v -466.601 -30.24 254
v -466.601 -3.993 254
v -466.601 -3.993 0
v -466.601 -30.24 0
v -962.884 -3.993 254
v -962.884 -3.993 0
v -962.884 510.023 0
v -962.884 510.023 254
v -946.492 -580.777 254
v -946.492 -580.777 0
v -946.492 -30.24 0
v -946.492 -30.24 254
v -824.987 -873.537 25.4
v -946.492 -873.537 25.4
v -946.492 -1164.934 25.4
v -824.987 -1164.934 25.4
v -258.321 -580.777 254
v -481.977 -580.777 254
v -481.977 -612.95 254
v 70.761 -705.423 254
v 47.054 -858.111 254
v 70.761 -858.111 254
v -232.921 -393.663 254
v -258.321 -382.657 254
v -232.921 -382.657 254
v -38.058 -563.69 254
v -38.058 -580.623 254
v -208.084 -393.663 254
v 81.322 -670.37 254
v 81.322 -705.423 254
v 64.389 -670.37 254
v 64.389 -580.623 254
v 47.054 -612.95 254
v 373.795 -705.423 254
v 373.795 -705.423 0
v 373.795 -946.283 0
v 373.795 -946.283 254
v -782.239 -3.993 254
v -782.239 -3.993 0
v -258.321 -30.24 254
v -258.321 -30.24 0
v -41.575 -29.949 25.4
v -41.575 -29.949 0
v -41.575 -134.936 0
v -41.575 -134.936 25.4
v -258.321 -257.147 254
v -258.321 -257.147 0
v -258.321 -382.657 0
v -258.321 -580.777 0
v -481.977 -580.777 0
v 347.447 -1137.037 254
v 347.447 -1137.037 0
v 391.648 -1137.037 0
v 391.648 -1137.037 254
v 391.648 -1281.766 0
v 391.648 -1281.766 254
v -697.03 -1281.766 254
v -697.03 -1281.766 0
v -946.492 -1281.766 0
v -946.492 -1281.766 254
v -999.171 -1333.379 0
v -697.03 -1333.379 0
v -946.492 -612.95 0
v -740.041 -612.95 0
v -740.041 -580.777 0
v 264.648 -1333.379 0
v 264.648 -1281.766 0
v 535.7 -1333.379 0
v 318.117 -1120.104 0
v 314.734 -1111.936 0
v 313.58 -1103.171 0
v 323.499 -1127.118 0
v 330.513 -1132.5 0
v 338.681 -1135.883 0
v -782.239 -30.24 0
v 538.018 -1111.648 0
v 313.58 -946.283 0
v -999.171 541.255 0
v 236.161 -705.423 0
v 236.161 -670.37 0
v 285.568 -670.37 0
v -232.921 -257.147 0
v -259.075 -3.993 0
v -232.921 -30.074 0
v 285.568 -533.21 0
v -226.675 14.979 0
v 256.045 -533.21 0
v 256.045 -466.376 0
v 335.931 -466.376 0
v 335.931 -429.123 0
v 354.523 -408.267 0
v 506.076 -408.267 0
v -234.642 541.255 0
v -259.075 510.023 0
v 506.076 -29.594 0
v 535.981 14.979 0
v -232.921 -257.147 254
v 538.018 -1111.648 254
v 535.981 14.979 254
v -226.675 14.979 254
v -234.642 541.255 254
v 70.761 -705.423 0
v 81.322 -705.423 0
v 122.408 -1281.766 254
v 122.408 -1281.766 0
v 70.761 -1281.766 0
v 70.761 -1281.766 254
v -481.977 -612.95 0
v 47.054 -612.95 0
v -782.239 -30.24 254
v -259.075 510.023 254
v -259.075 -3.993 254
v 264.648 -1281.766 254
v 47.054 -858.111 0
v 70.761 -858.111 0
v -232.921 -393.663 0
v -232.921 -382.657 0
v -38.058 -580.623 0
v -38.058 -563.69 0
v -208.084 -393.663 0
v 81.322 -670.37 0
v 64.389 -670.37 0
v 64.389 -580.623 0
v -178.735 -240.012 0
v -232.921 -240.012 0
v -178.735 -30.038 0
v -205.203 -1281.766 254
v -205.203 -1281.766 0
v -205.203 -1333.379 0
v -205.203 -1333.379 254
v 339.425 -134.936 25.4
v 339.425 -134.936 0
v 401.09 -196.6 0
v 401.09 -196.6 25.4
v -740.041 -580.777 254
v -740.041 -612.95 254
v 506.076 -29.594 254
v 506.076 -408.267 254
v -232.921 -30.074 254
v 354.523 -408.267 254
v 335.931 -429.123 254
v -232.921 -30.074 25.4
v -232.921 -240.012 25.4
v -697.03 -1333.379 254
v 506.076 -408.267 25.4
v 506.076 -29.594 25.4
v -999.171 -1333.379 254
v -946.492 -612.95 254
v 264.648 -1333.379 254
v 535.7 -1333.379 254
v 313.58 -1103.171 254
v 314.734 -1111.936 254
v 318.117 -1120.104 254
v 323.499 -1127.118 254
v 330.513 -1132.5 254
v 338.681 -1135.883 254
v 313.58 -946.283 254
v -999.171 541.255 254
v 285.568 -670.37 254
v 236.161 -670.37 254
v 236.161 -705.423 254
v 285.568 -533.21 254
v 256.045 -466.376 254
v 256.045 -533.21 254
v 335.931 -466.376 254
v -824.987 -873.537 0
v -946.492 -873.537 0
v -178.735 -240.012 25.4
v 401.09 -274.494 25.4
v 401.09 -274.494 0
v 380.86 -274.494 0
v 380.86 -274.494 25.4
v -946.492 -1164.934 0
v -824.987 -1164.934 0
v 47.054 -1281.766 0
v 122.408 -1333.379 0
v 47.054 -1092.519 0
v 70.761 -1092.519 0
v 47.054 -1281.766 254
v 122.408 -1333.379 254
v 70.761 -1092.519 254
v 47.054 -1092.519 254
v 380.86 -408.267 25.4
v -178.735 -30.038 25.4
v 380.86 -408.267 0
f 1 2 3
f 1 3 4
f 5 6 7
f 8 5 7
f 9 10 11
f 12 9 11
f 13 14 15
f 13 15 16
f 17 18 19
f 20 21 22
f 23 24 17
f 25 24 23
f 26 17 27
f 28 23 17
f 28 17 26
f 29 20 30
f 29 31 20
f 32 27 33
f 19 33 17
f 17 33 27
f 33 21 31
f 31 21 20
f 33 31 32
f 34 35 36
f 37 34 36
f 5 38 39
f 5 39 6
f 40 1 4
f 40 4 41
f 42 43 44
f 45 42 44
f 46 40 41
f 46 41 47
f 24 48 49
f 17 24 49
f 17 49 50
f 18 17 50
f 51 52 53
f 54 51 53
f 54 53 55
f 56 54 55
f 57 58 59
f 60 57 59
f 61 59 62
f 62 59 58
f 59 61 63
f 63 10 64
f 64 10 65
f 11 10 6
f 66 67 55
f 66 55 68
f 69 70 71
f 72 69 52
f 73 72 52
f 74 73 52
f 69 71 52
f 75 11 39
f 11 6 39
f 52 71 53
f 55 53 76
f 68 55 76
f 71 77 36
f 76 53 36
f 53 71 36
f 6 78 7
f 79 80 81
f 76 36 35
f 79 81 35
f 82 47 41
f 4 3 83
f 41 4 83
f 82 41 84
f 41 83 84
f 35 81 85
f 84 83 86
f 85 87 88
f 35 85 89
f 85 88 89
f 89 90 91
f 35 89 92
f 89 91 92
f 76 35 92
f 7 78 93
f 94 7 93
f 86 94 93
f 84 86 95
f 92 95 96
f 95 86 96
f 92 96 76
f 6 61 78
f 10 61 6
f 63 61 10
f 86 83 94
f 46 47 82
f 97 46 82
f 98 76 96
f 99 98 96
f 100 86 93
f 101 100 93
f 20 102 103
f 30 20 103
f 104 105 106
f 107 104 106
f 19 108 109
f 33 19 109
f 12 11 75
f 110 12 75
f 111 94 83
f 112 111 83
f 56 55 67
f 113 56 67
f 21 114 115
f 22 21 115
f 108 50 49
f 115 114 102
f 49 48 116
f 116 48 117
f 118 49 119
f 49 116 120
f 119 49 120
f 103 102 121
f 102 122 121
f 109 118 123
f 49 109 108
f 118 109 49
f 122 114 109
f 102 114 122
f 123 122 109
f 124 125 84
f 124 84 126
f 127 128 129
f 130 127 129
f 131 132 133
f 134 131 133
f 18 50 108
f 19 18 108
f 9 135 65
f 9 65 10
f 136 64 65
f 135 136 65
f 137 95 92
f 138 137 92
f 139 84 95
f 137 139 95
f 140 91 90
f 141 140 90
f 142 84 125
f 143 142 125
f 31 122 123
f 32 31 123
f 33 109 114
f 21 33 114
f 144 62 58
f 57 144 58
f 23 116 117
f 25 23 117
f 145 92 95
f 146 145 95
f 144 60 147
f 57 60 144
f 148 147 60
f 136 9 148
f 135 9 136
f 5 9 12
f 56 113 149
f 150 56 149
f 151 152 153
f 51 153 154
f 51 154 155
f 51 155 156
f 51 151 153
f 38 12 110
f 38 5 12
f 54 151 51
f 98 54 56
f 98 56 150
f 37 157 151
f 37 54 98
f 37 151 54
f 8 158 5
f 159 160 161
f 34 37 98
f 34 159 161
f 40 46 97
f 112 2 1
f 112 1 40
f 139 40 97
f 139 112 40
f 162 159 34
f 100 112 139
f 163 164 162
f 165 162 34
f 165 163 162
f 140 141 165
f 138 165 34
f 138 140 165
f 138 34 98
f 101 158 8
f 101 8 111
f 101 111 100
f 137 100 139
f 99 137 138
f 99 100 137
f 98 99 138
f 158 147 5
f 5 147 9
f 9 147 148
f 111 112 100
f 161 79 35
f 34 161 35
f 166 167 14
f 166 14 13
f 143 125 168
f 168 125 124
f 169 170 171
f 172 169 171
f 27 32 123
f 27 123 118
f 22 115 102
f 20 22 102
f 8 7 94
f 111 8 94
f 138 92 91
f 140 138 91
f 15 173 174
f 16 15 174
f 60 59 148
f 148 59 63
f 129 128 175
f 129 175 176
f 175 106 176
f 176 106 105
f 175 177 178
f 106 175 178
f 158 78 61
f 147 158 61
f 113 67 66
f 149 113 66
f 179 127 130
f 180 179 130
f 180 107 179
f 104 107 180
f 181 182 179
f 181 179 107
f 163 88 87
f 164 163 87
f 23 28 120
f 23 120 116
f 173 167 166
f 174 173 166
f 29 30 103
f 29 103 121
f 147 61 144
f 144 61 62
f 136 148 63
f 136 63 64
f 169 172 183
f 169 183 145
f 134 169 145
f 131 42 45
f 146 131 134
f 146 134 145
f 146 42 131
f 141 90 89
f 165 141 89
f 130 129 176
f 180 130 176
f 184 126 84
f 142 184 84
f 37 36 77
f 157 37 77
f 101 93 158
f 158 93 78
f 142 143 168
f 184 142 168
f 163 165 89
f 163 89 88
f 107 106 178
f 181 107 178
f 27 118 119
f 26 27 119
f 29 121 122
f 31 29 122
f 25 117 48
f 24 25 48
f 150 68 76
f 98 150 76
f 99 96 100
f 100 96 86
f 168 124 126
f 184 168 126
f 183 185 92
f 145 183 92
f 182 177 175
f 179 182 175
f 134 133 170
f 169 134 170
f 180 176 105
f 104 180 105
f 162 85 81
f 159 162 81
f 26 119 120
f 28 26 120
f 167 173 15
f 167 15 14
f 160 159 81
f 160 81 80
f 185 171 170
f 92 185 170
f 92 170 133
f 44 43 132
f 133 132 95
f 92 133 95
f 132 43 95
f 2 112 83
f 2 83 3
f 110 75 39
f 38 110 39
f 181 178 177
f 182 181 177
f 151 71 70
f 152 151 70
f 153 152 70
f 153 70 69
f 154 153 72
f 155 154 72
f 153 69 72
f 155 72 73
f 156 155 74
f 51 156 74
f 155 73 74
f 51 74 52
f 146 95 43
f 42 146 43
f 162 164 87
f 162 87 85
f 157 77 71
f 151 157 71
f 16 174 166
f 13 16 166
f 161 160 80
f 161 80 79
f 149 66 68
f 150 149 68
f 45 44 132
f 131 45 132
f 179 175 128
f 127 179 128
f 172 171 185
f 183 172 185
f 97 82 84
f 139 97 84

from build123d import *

# Parameters (mm, degrees)
F2_DEPTH = 254
F3_DEPTH = 25.4
F1_W     = 121.5051418
F1_H     = 291.3972582
F4_DEPTH = 25.4


# Not quite as in the source:
# - ends of sketch curves that miss each other by under 0.0002 mm in the source are joined


with BuildPart() as f2:
    # F1 (on face) → F2 (new body)
    with BuildSketch(Plane.XY):
        with BuildLine():
            Line((313.5800008442, -946.2826725998), (313.5800008442, -1103.1705731998))
            ThreePointArc((313.5800008442, -1103.1705731998), (323.4993407748, -1127.1179168691), (347.4466844442, -1137.0372313998))
            Line((347.4466844442, -1137.0372313998), (391.6476882442, -1137.0372567998))
            Line((391.6476882442, -1137.0372567998), (391.6476882442, -1281.7658725998))
            Line((391.6476882442, -1281.7658725998), (264.6476882442, -1281.7658725998))
            Line((264.6476882442, -1281.7658725998), (264.6476882442, -1333.3786725998))
            Line((264.6476882442, -1333.3786725998), (535.6998512442, -1333.3786725998))
            Line((535.6998512442, -1333.3786725998), (538.0177605074, -1111.6484430823))
            Line((538.0177605074, -1111.6484430823), (535.9808760803, 14.9786700639))
            Line((535.9808760803, 14.9786700639), (-226.6753639778, 14.9786700639))
            Line((-226.6753639778, 14.9786700639), (-234.6419504656, 541.2551566362))
            Line((-234.6419504656, 541.2551566362), (-999.1706609726, 541.2551566362))
            Line((-999.1706609726, 541.2551566362), (-999.1706609726, -1333.3786725998))
            Line((-999.1706609726, -1333.3786725998), (-697.0301953558, -1333.3786725998))
            Line((-697.0301953558, -1333.3786725998), (-697.0301953558, -1281.7658725998))
            Line((-697.0301953558, -1281.7658725998), (-946.4920535558, -1281.7658725998))
            Line((-946.4920535558, -1281.7658725998), (-946.4920535558, -1164.9343561998))
            Line((-946.4920535558, -1164.9343561998), (-946.4920535558, -873.5370979998))
            Line((-946.4920535558, -873.5370979998), (-946.4920535558, -612.9500143998))
            Line((-946.4920535558, -612.9500143998), (-740.0408535558, -612.9500143998))
            Line((-740.0408535558, -612.9500143998), (-740.0408535558, -587.1436143998))
            Line((-740.0408535558, -587.1436143998), (-740.0408535558, -580.7766725998))
            Line((-740.0408535558, -580.7766725998), (-946.4920535558, -580.7766725998))
            Line((-946.4920535558, -580.7766725998), (-946.4920535558, -30.2401307998))
            Line((-946.4920535558, -30.2401307998), (-782.2387117558, -30.2401307998))
            Line((-782.2387117558, -30.2401307998), (-782.2387117558, -3.9934725998))
            Line((-782.2387117558, -3.9934725998), (-962.8835117558, -3.9934725998))
            Line((-962.8835117558, -3.9934725998), (-962.8835117558, 510.0225682002))
            Line((-962.8835117558, 510.0225682002), (-259.0749117558, 510.0225682002))
            Line((-259.0749117558, 510.0225682002), (-259.0749117558, -3.9934725998))
            Line((-259.0749117558, -3.9934725998), (-466.6013953558, -3.9934725998))
            Line((-466.6013953558, -3.9934725998), (-466.6013953558, -30.2401307998))
            Line((-466.6013953558, -30.2401307998), (-258.3213953558, -30.2401307998))
            Line((-258.3213953558, -30.2401307998), (-258.3213953558, -257.1468143998))
            Line((-258.3213953558, -257.1468143998), (-232.9213953558, -257.1468143998))
            Line((-232.9213953558, -257.1468143998), (-232.9213953558, -240.0117203998))
            Line((-232.9213953558, -240.0117203998), (-232.9213953558, -30.0735575998))
            Line((-232.9213953558, -30.0735575998), (-178.7347117587, -30.0383741748))
            Line((-178.7347117587, -30.0383741748), (-41.5747117624, -29.9493161581))
            Line((-41.5747117624, -29.9493161581), (506.0763646442, -29.5937261998))
            Line((506.0763646442, -29.5937261998), (506.0763646442, -408.2670861998))
            Line((506.0763646442, -408.2670861998), (380.8600796442, -408.2670861998))
            Line((380.8600796442, -408.2670861998), (354.5230482442, -408.2670861998))
            Line((354.5230482442, -408.2670861998), (335.9305276442, -429.1228229998))
            Line((335.9305276442, -429.1228229998), (335.9305276442, -466.3761647998))
            Line((335.9305276442, -466.3761647998), (256.0446066442, -466.3761647998))
            Line((256.0446066442, -466.3761647998), (256.0446066442, -533.2095337998))
            Line((256.0446066442, -533.2095337998), (285.5676616442, -533.2095337998))
            Line((285.5676616442, -533.2095337998), (285.5676616442, -670.3695337998))
            Line((285.5676616442, -670.3695337998), (236.1608008442, -670.3695337998))
            Line((236.1608008442, -670.3695337998), (236.1608008442, -705.4229307998))
            Line((236.1608008442, -705.4229307998), (373.7949426442, -705.4229307998))
            Line((373.7949426442, -705.4229307998), (373.7949426442, -946.2826725998))
            Line((373.7949426442, -946.2826725998), (313.5800008442, -946.2826725998))
        make_face()
    extrude(amount=F2_DEPTH)


with BuildPart() as f2b:
    # F1 (on face) → F2, piece 2 (new body)
    with BuildSketch(Plane.XY):
        Polygon((-258.3213953558, -382.6566725998), (-258.3213953558, -580.7766725998), (-481.9768535558, -580.7766725998), (-481.9768535558, -612.9500143998), (47.0543464442, -612.9500143998), (47.0543464442, -858.1108143998), (70.7610046442, -858.1108143998), (70.7610046442, -705.4229307998), (81.3224008442, -705.4229307998), (81.3224008442, -670.3695337998), (64.3890844442, -670.3695337998), (64.3890844442, -580.6228501998), (-38.0575991558, -580.6228501998), (-38.0575991558, -563.6895337998), (-208.0837767558, -393.6633307998), (-232.9213953558, -393.6633307998), (-232.9213953558, -382.6566725998), align=None)
    extrude(amount=F2_DEPTH)


with BuildPart() as f2c:
    # F1 (on face) → F2, piece 3 (new body)
    with BuildSketch(Plane.XY):
        Polygon((-205.2032135558, -1333.3786725998), (122.4076882442, -1333.3786725998), (122.4076882442, -1281.7658725998), (70.7610046442, -1281.7658725998), (70.7610046442, -1092.5189307998), (47.0543464442, -1092.5189307998), (47.0543464442, -1281.7658725998), (-205.2032135558, -1281.7658725998), align=None)
    extrude(amount=F2_DEPTH)


with BuildPart() as f3:
    # F1 (on face) → F3 (new body)
    with BuildSketch(Plane.XY):
        Polygon((380.8600796442, -274.4937443998), (380.8600796442, -408.2670861998), (506.0763646442, -408.2670861998), (506.0763646442, -29.5937261998), (-41.5747117624, -29.9493161581), (-41.5747117558, -134.9359843998), (339.4252882442, -134.9359843998), (401.0897064442, -196.6004025998), (401.0897064442, -274.4937443998), align=None)
    extrude(amount=F3_DEPTH)


with BuildPart() as f3b:
    # F1 (on face) → F3, piece 2 (new body)
    with BuildSketch(Plane.XY):
        Polygon((-178.7347117558, -240.0117203998), (-178.7347117558, -30.0383785998), (-232.9213953558, -30.0735575998), (-232.9213953558, -240.0117203998), align=None)
    extrude(amount=F3_DEPTH)


with BuildPart() as f4:
    # F1 (on face) → F4 (new body)
    with BuildSketch(Plane.XY):
        with Locations((-885.7394826558, -1019.2357270998)):
            Rectangle(F1_W, F1_H)
    extrude(amount=F4_DEPTH)


solid = Compound([f2.part, f2b.part, f2c.part, f3.part, f3b.part, f4.part])
